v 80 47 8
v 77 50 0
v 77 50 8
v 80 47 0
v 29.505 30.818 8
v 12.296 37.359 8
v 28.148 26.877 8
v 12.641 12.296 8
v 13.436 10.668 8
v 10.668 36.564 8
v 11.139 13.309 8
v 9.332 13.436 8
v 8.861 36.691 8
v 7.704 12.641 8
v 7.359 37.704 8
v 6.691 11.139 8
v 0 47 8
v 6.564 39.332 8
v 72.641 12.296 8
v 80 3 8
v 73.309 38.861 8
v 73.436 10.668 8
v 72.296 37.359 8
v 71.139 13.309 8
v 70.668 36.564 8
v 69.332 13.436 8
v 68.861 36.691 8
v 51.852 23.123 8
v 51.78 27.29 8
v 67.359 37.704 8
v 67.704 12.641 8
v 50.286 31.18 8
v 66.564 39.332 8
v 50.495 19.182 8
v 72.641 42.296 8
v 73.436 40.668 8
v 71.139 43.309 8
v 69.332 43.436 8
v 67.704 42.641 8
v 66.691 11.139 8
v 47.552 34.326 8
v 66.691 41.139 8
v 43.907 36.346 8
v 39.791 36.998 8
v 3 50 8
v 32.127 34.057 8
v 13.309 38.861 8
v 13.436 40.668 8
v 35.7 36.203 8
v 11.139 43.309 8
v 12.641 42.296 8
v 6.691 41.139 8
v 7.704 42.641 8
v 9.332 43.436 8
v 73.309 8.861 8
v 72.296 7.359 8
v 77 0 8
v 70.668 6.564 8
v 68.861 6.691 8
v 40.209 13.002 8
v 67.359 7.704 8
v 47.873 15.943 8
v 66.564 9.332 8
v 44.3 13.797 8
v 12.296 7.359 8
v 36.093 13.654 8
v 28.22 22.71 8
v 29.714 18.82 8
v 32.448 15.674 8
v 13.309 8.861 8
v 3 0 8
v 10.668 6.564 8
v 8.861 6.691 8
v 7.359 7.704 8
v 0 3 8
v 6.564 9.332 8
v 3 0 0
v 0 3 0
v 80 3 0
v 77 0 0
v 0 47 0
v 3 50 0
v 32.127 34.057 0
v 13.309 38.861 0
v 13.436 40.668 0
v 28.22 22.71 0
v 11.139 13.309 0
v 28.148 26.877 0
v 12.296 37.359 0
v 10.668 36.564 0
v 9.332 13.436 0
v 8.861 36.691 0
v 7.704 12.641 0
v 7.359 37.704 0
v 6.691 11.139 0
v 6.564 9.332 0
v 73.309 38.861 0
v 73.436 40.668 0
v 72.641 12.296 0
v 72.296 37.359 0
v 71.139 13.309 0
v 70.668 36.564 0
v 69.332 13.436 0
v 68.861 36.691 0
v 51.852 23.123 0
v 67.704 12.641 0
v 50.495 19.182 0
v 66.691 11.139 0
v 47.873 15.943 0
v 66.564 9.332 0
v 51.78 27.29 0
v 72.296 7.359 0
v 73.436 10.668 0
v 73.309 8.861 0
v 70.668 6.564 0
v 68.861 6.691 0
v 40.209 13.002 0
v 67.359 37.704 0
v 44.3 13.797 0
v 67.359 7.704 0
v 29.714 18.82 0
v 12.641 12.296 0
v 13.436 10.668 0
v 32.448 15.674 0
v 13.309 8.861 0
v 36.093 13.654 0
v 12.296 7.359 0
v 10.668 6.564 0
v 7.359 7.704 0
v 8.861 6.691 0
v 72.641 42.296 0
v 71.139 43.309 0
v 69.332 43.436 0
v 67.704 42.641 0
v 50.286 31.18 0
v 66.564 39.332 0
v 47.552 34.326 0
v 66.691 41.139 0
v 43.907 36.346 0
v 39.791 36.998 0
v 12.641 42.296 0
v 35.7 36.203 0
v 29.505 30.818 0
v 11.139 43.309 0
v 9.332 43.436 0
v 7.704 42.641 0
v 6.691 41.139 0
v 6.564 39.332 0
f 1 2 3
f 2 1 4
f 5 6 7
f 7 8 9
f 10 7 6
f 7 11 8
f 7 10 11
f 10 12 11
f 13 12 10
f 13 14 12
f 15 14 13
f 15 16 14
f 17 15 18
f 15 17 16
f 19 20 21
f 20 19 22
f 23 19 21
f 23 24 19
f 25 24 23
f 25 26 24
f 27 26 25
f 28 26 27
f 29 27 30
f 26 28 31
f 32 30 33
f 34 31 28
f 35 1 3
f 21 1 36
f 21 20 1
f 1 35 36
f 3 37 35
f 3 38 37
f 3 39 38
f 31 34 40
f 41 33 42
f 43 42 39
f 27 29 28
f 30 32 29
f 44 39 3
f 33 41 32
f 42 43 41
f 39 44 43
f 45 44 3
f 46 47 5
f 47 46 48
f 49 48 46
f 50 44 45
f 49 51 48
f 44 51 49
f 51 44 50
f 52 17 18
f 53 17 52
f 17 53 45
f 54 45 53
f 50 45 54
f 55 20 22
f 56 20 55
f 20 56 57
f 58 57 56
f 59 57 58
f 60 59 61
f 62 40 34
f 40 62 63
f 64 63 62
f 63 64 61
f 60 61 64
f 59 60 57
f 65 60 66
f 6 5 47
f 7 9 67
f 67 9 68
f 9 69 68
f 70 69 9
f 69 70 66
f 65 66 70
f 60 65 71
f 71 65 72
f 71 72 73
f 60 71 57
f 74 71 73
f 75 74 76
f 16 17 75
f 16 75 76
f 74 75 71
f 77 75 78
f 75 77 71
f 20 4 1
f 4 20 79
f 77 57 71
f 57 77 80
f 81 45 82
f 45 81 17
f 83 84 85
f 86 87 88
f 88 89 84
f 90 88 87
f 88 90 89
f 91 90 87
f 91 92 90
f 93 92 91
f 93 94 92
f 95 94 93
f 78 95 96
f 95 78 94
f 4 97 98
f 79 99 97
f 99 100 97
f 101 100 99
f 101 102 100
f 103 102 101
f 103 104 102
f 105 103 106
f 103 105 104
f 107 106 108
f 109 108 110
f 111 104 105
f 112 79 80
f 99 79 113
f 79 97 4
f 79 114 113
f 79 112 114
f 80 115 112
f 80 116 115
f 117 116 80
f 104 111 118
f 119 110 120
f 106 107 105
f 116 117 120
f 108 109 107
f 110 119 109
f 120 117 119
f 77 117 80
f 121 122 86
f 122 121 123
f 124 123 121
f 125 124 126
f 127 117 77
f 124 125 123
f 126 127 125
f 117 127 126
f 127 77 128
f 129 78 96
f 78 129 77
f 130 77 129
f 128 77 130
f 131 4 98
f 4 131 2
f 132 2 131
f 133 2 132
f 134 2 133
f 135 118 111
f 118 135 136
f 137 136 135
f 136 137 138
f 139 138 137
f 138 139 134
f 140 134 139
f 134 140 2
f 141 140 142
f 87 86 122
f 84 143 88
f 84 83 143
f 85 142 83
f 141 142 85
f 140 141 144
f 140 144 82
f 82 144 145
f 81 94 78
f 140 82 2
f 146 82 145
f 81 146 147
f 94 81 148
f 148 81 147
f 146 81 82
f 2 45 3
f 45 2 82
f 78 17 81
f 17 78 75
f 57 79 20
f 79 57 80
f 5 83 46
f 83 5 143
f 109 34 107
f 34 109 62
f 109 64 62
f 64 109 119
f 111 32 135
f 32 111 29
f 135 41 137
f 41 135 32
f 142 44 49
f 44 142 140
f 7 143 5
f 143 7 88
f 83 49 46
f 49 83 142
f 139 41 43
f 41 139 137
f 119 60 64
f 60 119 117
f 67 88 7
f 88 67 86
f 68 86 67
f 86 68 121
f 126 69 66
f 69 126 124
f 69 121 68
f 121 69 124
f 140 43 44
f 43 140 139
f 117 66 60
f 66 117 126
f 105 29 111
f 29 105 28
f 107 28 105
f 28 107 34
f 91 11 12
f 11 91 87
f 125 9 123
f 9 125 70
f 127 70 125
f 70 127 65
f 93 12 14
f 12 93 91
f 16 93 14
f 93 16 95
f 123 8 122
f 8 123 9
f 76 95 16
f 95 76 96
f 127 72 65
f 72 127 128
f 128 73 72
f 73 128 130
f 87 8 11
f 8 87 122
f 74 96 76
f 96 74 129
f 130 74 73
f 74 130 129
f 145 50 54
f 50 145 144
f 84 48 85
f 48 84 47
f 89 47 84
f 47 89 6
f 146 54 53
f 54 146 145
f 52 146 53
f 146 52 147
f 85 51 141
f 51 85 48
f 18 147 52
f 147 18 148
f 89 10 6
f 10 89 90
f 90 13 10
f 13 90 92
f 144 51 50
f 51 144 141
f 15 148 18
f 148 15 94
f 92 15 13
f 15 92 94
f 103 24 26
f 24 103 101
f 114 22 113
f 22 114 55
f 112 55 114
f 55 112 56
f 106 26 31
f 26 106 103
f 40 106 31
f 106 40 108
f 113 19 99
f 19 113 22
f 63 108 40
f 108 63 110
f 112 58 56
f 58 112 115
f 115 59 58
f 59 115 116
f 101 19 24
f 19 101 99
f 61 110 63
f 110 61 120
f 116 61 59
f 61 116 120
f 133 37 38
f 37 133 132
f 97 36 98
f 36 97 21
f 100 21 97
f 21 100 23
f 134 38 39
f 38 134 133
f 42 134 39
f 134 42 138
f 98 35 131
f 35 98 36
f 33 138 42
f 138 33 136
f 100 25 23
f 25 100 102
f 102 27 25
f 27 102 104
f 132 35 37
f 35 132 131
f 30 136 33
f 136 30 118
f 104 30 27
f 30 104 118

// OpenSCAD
$fn = 32;

// ----------------------------------------------------------------------
// Spacer plate: rect 80 x 50
// ----------------------------------------------------------------------

// --- parameters (mm) ---
bore_r = 12;              // centre bore radius
bolt_r = 3.5;             // bolt hole radius
plate_t = 8;              // plate thickness, Z (extrusion height)
plate_l = 80;             // plate length, X
plate_w = 50;             // plate width, Y
inset = 10;               // corner hole inset
fit_tol = 0.02;           // declared fit tolerance (prompt contract)
free_tol = 0.2;           // declared free tolerance (prompt contract)

profile = [[3, 0], [77, 0], [80, 3], [80, 47], [77, 50], [3, 50], [0, 47], [0, 3]];  // primary outline, 8 points, counter clockwise
void_1 = [[51.78, 27.29], [50.286, 31.18], [47.552, 34.326], [43.907, 36.346], [39.791, 36.998], [35.7, 36.203], [32.127, 34.057], [29.505, 30.818], [28.148, 26.877], [28.22, 22.71], [29.714, 18.82], [32.448, 15.674], [36.093, 13.654], [40.209, 13.002], [44.3, 13.797], [47.873, 15.943], [50.495, 19.182], [51.852, 23.123]];  // centre bore, 18 points
void_2 = [[13.436, 10.668], [12.641, 12.296], [11.139, 13.309], [9.332, 13.436], [7.704, 12.641], [6.691, 11.139], [6.564, 9.332], [7.359, 7.704], [8.861, 6.691], [10.668, 6.564], [12.296, 7.359], [13.309, 8.861]];  // corner hole, 12 points
void_3 = [[13.436, 40.668], [12.641, 42.296], [11.139, 43.309], [9.332, 43.436], [7.704, 42.641], [6.691, 41.139], [6.564, 39.332], [7.359, 37.704], [8.861, 36.691], [10.668, 36.564], [12.296, 37.359], [13.309, 38.861]];  // corner hole, 12 points
void_4 = [[73.436, 10.668], [72.641, 12.296], [71.139, 13.309], [69.332, 13.436], [67.704, 12.641], [66.691, 11.139], [66.564, 9.332], [67.359, 7.704], [68.861, 6.691], [70.668, 6.564], [72.296, 7.359], [73.309, 8.861]];  // corner hole, 12 points
void_5 = [[73.436, 40.668], [72.641, 42.296], [71.139, 43.309], [69.332, 43.436], [67.704, 42.641], [66.691, 41.139], [66.564, 39.332], [67.359, 37.704], [68.861, 36.691], [70.668, 36.564], [72.296, 37.359], [73.309, 38.861]];  // corner hole, 12 points

// --- the one profile operation ---
difference() {
  linear_extrude(height = plate_t) polygon(points = profile);
  translate([0, 0, -1])
    linear_extrude(height = plate_t + 2) polygon(points = void_1);
  translate([0, 0, -1])
    linear_extrude(height = plate_t + 2) polygon(points = void_2);
  translate([0, 0, -1])
    linear_extrude(height = plate_t + 2) polygon(points = void_3);
  translate([0, 0, -1])
    linear_extrude(height = plate_t + 2) polygon(points = void_4);
  translate([0, 0, -1])
    linear_extrude(height = plate_t + 2) polygon(points = void_5);
}
